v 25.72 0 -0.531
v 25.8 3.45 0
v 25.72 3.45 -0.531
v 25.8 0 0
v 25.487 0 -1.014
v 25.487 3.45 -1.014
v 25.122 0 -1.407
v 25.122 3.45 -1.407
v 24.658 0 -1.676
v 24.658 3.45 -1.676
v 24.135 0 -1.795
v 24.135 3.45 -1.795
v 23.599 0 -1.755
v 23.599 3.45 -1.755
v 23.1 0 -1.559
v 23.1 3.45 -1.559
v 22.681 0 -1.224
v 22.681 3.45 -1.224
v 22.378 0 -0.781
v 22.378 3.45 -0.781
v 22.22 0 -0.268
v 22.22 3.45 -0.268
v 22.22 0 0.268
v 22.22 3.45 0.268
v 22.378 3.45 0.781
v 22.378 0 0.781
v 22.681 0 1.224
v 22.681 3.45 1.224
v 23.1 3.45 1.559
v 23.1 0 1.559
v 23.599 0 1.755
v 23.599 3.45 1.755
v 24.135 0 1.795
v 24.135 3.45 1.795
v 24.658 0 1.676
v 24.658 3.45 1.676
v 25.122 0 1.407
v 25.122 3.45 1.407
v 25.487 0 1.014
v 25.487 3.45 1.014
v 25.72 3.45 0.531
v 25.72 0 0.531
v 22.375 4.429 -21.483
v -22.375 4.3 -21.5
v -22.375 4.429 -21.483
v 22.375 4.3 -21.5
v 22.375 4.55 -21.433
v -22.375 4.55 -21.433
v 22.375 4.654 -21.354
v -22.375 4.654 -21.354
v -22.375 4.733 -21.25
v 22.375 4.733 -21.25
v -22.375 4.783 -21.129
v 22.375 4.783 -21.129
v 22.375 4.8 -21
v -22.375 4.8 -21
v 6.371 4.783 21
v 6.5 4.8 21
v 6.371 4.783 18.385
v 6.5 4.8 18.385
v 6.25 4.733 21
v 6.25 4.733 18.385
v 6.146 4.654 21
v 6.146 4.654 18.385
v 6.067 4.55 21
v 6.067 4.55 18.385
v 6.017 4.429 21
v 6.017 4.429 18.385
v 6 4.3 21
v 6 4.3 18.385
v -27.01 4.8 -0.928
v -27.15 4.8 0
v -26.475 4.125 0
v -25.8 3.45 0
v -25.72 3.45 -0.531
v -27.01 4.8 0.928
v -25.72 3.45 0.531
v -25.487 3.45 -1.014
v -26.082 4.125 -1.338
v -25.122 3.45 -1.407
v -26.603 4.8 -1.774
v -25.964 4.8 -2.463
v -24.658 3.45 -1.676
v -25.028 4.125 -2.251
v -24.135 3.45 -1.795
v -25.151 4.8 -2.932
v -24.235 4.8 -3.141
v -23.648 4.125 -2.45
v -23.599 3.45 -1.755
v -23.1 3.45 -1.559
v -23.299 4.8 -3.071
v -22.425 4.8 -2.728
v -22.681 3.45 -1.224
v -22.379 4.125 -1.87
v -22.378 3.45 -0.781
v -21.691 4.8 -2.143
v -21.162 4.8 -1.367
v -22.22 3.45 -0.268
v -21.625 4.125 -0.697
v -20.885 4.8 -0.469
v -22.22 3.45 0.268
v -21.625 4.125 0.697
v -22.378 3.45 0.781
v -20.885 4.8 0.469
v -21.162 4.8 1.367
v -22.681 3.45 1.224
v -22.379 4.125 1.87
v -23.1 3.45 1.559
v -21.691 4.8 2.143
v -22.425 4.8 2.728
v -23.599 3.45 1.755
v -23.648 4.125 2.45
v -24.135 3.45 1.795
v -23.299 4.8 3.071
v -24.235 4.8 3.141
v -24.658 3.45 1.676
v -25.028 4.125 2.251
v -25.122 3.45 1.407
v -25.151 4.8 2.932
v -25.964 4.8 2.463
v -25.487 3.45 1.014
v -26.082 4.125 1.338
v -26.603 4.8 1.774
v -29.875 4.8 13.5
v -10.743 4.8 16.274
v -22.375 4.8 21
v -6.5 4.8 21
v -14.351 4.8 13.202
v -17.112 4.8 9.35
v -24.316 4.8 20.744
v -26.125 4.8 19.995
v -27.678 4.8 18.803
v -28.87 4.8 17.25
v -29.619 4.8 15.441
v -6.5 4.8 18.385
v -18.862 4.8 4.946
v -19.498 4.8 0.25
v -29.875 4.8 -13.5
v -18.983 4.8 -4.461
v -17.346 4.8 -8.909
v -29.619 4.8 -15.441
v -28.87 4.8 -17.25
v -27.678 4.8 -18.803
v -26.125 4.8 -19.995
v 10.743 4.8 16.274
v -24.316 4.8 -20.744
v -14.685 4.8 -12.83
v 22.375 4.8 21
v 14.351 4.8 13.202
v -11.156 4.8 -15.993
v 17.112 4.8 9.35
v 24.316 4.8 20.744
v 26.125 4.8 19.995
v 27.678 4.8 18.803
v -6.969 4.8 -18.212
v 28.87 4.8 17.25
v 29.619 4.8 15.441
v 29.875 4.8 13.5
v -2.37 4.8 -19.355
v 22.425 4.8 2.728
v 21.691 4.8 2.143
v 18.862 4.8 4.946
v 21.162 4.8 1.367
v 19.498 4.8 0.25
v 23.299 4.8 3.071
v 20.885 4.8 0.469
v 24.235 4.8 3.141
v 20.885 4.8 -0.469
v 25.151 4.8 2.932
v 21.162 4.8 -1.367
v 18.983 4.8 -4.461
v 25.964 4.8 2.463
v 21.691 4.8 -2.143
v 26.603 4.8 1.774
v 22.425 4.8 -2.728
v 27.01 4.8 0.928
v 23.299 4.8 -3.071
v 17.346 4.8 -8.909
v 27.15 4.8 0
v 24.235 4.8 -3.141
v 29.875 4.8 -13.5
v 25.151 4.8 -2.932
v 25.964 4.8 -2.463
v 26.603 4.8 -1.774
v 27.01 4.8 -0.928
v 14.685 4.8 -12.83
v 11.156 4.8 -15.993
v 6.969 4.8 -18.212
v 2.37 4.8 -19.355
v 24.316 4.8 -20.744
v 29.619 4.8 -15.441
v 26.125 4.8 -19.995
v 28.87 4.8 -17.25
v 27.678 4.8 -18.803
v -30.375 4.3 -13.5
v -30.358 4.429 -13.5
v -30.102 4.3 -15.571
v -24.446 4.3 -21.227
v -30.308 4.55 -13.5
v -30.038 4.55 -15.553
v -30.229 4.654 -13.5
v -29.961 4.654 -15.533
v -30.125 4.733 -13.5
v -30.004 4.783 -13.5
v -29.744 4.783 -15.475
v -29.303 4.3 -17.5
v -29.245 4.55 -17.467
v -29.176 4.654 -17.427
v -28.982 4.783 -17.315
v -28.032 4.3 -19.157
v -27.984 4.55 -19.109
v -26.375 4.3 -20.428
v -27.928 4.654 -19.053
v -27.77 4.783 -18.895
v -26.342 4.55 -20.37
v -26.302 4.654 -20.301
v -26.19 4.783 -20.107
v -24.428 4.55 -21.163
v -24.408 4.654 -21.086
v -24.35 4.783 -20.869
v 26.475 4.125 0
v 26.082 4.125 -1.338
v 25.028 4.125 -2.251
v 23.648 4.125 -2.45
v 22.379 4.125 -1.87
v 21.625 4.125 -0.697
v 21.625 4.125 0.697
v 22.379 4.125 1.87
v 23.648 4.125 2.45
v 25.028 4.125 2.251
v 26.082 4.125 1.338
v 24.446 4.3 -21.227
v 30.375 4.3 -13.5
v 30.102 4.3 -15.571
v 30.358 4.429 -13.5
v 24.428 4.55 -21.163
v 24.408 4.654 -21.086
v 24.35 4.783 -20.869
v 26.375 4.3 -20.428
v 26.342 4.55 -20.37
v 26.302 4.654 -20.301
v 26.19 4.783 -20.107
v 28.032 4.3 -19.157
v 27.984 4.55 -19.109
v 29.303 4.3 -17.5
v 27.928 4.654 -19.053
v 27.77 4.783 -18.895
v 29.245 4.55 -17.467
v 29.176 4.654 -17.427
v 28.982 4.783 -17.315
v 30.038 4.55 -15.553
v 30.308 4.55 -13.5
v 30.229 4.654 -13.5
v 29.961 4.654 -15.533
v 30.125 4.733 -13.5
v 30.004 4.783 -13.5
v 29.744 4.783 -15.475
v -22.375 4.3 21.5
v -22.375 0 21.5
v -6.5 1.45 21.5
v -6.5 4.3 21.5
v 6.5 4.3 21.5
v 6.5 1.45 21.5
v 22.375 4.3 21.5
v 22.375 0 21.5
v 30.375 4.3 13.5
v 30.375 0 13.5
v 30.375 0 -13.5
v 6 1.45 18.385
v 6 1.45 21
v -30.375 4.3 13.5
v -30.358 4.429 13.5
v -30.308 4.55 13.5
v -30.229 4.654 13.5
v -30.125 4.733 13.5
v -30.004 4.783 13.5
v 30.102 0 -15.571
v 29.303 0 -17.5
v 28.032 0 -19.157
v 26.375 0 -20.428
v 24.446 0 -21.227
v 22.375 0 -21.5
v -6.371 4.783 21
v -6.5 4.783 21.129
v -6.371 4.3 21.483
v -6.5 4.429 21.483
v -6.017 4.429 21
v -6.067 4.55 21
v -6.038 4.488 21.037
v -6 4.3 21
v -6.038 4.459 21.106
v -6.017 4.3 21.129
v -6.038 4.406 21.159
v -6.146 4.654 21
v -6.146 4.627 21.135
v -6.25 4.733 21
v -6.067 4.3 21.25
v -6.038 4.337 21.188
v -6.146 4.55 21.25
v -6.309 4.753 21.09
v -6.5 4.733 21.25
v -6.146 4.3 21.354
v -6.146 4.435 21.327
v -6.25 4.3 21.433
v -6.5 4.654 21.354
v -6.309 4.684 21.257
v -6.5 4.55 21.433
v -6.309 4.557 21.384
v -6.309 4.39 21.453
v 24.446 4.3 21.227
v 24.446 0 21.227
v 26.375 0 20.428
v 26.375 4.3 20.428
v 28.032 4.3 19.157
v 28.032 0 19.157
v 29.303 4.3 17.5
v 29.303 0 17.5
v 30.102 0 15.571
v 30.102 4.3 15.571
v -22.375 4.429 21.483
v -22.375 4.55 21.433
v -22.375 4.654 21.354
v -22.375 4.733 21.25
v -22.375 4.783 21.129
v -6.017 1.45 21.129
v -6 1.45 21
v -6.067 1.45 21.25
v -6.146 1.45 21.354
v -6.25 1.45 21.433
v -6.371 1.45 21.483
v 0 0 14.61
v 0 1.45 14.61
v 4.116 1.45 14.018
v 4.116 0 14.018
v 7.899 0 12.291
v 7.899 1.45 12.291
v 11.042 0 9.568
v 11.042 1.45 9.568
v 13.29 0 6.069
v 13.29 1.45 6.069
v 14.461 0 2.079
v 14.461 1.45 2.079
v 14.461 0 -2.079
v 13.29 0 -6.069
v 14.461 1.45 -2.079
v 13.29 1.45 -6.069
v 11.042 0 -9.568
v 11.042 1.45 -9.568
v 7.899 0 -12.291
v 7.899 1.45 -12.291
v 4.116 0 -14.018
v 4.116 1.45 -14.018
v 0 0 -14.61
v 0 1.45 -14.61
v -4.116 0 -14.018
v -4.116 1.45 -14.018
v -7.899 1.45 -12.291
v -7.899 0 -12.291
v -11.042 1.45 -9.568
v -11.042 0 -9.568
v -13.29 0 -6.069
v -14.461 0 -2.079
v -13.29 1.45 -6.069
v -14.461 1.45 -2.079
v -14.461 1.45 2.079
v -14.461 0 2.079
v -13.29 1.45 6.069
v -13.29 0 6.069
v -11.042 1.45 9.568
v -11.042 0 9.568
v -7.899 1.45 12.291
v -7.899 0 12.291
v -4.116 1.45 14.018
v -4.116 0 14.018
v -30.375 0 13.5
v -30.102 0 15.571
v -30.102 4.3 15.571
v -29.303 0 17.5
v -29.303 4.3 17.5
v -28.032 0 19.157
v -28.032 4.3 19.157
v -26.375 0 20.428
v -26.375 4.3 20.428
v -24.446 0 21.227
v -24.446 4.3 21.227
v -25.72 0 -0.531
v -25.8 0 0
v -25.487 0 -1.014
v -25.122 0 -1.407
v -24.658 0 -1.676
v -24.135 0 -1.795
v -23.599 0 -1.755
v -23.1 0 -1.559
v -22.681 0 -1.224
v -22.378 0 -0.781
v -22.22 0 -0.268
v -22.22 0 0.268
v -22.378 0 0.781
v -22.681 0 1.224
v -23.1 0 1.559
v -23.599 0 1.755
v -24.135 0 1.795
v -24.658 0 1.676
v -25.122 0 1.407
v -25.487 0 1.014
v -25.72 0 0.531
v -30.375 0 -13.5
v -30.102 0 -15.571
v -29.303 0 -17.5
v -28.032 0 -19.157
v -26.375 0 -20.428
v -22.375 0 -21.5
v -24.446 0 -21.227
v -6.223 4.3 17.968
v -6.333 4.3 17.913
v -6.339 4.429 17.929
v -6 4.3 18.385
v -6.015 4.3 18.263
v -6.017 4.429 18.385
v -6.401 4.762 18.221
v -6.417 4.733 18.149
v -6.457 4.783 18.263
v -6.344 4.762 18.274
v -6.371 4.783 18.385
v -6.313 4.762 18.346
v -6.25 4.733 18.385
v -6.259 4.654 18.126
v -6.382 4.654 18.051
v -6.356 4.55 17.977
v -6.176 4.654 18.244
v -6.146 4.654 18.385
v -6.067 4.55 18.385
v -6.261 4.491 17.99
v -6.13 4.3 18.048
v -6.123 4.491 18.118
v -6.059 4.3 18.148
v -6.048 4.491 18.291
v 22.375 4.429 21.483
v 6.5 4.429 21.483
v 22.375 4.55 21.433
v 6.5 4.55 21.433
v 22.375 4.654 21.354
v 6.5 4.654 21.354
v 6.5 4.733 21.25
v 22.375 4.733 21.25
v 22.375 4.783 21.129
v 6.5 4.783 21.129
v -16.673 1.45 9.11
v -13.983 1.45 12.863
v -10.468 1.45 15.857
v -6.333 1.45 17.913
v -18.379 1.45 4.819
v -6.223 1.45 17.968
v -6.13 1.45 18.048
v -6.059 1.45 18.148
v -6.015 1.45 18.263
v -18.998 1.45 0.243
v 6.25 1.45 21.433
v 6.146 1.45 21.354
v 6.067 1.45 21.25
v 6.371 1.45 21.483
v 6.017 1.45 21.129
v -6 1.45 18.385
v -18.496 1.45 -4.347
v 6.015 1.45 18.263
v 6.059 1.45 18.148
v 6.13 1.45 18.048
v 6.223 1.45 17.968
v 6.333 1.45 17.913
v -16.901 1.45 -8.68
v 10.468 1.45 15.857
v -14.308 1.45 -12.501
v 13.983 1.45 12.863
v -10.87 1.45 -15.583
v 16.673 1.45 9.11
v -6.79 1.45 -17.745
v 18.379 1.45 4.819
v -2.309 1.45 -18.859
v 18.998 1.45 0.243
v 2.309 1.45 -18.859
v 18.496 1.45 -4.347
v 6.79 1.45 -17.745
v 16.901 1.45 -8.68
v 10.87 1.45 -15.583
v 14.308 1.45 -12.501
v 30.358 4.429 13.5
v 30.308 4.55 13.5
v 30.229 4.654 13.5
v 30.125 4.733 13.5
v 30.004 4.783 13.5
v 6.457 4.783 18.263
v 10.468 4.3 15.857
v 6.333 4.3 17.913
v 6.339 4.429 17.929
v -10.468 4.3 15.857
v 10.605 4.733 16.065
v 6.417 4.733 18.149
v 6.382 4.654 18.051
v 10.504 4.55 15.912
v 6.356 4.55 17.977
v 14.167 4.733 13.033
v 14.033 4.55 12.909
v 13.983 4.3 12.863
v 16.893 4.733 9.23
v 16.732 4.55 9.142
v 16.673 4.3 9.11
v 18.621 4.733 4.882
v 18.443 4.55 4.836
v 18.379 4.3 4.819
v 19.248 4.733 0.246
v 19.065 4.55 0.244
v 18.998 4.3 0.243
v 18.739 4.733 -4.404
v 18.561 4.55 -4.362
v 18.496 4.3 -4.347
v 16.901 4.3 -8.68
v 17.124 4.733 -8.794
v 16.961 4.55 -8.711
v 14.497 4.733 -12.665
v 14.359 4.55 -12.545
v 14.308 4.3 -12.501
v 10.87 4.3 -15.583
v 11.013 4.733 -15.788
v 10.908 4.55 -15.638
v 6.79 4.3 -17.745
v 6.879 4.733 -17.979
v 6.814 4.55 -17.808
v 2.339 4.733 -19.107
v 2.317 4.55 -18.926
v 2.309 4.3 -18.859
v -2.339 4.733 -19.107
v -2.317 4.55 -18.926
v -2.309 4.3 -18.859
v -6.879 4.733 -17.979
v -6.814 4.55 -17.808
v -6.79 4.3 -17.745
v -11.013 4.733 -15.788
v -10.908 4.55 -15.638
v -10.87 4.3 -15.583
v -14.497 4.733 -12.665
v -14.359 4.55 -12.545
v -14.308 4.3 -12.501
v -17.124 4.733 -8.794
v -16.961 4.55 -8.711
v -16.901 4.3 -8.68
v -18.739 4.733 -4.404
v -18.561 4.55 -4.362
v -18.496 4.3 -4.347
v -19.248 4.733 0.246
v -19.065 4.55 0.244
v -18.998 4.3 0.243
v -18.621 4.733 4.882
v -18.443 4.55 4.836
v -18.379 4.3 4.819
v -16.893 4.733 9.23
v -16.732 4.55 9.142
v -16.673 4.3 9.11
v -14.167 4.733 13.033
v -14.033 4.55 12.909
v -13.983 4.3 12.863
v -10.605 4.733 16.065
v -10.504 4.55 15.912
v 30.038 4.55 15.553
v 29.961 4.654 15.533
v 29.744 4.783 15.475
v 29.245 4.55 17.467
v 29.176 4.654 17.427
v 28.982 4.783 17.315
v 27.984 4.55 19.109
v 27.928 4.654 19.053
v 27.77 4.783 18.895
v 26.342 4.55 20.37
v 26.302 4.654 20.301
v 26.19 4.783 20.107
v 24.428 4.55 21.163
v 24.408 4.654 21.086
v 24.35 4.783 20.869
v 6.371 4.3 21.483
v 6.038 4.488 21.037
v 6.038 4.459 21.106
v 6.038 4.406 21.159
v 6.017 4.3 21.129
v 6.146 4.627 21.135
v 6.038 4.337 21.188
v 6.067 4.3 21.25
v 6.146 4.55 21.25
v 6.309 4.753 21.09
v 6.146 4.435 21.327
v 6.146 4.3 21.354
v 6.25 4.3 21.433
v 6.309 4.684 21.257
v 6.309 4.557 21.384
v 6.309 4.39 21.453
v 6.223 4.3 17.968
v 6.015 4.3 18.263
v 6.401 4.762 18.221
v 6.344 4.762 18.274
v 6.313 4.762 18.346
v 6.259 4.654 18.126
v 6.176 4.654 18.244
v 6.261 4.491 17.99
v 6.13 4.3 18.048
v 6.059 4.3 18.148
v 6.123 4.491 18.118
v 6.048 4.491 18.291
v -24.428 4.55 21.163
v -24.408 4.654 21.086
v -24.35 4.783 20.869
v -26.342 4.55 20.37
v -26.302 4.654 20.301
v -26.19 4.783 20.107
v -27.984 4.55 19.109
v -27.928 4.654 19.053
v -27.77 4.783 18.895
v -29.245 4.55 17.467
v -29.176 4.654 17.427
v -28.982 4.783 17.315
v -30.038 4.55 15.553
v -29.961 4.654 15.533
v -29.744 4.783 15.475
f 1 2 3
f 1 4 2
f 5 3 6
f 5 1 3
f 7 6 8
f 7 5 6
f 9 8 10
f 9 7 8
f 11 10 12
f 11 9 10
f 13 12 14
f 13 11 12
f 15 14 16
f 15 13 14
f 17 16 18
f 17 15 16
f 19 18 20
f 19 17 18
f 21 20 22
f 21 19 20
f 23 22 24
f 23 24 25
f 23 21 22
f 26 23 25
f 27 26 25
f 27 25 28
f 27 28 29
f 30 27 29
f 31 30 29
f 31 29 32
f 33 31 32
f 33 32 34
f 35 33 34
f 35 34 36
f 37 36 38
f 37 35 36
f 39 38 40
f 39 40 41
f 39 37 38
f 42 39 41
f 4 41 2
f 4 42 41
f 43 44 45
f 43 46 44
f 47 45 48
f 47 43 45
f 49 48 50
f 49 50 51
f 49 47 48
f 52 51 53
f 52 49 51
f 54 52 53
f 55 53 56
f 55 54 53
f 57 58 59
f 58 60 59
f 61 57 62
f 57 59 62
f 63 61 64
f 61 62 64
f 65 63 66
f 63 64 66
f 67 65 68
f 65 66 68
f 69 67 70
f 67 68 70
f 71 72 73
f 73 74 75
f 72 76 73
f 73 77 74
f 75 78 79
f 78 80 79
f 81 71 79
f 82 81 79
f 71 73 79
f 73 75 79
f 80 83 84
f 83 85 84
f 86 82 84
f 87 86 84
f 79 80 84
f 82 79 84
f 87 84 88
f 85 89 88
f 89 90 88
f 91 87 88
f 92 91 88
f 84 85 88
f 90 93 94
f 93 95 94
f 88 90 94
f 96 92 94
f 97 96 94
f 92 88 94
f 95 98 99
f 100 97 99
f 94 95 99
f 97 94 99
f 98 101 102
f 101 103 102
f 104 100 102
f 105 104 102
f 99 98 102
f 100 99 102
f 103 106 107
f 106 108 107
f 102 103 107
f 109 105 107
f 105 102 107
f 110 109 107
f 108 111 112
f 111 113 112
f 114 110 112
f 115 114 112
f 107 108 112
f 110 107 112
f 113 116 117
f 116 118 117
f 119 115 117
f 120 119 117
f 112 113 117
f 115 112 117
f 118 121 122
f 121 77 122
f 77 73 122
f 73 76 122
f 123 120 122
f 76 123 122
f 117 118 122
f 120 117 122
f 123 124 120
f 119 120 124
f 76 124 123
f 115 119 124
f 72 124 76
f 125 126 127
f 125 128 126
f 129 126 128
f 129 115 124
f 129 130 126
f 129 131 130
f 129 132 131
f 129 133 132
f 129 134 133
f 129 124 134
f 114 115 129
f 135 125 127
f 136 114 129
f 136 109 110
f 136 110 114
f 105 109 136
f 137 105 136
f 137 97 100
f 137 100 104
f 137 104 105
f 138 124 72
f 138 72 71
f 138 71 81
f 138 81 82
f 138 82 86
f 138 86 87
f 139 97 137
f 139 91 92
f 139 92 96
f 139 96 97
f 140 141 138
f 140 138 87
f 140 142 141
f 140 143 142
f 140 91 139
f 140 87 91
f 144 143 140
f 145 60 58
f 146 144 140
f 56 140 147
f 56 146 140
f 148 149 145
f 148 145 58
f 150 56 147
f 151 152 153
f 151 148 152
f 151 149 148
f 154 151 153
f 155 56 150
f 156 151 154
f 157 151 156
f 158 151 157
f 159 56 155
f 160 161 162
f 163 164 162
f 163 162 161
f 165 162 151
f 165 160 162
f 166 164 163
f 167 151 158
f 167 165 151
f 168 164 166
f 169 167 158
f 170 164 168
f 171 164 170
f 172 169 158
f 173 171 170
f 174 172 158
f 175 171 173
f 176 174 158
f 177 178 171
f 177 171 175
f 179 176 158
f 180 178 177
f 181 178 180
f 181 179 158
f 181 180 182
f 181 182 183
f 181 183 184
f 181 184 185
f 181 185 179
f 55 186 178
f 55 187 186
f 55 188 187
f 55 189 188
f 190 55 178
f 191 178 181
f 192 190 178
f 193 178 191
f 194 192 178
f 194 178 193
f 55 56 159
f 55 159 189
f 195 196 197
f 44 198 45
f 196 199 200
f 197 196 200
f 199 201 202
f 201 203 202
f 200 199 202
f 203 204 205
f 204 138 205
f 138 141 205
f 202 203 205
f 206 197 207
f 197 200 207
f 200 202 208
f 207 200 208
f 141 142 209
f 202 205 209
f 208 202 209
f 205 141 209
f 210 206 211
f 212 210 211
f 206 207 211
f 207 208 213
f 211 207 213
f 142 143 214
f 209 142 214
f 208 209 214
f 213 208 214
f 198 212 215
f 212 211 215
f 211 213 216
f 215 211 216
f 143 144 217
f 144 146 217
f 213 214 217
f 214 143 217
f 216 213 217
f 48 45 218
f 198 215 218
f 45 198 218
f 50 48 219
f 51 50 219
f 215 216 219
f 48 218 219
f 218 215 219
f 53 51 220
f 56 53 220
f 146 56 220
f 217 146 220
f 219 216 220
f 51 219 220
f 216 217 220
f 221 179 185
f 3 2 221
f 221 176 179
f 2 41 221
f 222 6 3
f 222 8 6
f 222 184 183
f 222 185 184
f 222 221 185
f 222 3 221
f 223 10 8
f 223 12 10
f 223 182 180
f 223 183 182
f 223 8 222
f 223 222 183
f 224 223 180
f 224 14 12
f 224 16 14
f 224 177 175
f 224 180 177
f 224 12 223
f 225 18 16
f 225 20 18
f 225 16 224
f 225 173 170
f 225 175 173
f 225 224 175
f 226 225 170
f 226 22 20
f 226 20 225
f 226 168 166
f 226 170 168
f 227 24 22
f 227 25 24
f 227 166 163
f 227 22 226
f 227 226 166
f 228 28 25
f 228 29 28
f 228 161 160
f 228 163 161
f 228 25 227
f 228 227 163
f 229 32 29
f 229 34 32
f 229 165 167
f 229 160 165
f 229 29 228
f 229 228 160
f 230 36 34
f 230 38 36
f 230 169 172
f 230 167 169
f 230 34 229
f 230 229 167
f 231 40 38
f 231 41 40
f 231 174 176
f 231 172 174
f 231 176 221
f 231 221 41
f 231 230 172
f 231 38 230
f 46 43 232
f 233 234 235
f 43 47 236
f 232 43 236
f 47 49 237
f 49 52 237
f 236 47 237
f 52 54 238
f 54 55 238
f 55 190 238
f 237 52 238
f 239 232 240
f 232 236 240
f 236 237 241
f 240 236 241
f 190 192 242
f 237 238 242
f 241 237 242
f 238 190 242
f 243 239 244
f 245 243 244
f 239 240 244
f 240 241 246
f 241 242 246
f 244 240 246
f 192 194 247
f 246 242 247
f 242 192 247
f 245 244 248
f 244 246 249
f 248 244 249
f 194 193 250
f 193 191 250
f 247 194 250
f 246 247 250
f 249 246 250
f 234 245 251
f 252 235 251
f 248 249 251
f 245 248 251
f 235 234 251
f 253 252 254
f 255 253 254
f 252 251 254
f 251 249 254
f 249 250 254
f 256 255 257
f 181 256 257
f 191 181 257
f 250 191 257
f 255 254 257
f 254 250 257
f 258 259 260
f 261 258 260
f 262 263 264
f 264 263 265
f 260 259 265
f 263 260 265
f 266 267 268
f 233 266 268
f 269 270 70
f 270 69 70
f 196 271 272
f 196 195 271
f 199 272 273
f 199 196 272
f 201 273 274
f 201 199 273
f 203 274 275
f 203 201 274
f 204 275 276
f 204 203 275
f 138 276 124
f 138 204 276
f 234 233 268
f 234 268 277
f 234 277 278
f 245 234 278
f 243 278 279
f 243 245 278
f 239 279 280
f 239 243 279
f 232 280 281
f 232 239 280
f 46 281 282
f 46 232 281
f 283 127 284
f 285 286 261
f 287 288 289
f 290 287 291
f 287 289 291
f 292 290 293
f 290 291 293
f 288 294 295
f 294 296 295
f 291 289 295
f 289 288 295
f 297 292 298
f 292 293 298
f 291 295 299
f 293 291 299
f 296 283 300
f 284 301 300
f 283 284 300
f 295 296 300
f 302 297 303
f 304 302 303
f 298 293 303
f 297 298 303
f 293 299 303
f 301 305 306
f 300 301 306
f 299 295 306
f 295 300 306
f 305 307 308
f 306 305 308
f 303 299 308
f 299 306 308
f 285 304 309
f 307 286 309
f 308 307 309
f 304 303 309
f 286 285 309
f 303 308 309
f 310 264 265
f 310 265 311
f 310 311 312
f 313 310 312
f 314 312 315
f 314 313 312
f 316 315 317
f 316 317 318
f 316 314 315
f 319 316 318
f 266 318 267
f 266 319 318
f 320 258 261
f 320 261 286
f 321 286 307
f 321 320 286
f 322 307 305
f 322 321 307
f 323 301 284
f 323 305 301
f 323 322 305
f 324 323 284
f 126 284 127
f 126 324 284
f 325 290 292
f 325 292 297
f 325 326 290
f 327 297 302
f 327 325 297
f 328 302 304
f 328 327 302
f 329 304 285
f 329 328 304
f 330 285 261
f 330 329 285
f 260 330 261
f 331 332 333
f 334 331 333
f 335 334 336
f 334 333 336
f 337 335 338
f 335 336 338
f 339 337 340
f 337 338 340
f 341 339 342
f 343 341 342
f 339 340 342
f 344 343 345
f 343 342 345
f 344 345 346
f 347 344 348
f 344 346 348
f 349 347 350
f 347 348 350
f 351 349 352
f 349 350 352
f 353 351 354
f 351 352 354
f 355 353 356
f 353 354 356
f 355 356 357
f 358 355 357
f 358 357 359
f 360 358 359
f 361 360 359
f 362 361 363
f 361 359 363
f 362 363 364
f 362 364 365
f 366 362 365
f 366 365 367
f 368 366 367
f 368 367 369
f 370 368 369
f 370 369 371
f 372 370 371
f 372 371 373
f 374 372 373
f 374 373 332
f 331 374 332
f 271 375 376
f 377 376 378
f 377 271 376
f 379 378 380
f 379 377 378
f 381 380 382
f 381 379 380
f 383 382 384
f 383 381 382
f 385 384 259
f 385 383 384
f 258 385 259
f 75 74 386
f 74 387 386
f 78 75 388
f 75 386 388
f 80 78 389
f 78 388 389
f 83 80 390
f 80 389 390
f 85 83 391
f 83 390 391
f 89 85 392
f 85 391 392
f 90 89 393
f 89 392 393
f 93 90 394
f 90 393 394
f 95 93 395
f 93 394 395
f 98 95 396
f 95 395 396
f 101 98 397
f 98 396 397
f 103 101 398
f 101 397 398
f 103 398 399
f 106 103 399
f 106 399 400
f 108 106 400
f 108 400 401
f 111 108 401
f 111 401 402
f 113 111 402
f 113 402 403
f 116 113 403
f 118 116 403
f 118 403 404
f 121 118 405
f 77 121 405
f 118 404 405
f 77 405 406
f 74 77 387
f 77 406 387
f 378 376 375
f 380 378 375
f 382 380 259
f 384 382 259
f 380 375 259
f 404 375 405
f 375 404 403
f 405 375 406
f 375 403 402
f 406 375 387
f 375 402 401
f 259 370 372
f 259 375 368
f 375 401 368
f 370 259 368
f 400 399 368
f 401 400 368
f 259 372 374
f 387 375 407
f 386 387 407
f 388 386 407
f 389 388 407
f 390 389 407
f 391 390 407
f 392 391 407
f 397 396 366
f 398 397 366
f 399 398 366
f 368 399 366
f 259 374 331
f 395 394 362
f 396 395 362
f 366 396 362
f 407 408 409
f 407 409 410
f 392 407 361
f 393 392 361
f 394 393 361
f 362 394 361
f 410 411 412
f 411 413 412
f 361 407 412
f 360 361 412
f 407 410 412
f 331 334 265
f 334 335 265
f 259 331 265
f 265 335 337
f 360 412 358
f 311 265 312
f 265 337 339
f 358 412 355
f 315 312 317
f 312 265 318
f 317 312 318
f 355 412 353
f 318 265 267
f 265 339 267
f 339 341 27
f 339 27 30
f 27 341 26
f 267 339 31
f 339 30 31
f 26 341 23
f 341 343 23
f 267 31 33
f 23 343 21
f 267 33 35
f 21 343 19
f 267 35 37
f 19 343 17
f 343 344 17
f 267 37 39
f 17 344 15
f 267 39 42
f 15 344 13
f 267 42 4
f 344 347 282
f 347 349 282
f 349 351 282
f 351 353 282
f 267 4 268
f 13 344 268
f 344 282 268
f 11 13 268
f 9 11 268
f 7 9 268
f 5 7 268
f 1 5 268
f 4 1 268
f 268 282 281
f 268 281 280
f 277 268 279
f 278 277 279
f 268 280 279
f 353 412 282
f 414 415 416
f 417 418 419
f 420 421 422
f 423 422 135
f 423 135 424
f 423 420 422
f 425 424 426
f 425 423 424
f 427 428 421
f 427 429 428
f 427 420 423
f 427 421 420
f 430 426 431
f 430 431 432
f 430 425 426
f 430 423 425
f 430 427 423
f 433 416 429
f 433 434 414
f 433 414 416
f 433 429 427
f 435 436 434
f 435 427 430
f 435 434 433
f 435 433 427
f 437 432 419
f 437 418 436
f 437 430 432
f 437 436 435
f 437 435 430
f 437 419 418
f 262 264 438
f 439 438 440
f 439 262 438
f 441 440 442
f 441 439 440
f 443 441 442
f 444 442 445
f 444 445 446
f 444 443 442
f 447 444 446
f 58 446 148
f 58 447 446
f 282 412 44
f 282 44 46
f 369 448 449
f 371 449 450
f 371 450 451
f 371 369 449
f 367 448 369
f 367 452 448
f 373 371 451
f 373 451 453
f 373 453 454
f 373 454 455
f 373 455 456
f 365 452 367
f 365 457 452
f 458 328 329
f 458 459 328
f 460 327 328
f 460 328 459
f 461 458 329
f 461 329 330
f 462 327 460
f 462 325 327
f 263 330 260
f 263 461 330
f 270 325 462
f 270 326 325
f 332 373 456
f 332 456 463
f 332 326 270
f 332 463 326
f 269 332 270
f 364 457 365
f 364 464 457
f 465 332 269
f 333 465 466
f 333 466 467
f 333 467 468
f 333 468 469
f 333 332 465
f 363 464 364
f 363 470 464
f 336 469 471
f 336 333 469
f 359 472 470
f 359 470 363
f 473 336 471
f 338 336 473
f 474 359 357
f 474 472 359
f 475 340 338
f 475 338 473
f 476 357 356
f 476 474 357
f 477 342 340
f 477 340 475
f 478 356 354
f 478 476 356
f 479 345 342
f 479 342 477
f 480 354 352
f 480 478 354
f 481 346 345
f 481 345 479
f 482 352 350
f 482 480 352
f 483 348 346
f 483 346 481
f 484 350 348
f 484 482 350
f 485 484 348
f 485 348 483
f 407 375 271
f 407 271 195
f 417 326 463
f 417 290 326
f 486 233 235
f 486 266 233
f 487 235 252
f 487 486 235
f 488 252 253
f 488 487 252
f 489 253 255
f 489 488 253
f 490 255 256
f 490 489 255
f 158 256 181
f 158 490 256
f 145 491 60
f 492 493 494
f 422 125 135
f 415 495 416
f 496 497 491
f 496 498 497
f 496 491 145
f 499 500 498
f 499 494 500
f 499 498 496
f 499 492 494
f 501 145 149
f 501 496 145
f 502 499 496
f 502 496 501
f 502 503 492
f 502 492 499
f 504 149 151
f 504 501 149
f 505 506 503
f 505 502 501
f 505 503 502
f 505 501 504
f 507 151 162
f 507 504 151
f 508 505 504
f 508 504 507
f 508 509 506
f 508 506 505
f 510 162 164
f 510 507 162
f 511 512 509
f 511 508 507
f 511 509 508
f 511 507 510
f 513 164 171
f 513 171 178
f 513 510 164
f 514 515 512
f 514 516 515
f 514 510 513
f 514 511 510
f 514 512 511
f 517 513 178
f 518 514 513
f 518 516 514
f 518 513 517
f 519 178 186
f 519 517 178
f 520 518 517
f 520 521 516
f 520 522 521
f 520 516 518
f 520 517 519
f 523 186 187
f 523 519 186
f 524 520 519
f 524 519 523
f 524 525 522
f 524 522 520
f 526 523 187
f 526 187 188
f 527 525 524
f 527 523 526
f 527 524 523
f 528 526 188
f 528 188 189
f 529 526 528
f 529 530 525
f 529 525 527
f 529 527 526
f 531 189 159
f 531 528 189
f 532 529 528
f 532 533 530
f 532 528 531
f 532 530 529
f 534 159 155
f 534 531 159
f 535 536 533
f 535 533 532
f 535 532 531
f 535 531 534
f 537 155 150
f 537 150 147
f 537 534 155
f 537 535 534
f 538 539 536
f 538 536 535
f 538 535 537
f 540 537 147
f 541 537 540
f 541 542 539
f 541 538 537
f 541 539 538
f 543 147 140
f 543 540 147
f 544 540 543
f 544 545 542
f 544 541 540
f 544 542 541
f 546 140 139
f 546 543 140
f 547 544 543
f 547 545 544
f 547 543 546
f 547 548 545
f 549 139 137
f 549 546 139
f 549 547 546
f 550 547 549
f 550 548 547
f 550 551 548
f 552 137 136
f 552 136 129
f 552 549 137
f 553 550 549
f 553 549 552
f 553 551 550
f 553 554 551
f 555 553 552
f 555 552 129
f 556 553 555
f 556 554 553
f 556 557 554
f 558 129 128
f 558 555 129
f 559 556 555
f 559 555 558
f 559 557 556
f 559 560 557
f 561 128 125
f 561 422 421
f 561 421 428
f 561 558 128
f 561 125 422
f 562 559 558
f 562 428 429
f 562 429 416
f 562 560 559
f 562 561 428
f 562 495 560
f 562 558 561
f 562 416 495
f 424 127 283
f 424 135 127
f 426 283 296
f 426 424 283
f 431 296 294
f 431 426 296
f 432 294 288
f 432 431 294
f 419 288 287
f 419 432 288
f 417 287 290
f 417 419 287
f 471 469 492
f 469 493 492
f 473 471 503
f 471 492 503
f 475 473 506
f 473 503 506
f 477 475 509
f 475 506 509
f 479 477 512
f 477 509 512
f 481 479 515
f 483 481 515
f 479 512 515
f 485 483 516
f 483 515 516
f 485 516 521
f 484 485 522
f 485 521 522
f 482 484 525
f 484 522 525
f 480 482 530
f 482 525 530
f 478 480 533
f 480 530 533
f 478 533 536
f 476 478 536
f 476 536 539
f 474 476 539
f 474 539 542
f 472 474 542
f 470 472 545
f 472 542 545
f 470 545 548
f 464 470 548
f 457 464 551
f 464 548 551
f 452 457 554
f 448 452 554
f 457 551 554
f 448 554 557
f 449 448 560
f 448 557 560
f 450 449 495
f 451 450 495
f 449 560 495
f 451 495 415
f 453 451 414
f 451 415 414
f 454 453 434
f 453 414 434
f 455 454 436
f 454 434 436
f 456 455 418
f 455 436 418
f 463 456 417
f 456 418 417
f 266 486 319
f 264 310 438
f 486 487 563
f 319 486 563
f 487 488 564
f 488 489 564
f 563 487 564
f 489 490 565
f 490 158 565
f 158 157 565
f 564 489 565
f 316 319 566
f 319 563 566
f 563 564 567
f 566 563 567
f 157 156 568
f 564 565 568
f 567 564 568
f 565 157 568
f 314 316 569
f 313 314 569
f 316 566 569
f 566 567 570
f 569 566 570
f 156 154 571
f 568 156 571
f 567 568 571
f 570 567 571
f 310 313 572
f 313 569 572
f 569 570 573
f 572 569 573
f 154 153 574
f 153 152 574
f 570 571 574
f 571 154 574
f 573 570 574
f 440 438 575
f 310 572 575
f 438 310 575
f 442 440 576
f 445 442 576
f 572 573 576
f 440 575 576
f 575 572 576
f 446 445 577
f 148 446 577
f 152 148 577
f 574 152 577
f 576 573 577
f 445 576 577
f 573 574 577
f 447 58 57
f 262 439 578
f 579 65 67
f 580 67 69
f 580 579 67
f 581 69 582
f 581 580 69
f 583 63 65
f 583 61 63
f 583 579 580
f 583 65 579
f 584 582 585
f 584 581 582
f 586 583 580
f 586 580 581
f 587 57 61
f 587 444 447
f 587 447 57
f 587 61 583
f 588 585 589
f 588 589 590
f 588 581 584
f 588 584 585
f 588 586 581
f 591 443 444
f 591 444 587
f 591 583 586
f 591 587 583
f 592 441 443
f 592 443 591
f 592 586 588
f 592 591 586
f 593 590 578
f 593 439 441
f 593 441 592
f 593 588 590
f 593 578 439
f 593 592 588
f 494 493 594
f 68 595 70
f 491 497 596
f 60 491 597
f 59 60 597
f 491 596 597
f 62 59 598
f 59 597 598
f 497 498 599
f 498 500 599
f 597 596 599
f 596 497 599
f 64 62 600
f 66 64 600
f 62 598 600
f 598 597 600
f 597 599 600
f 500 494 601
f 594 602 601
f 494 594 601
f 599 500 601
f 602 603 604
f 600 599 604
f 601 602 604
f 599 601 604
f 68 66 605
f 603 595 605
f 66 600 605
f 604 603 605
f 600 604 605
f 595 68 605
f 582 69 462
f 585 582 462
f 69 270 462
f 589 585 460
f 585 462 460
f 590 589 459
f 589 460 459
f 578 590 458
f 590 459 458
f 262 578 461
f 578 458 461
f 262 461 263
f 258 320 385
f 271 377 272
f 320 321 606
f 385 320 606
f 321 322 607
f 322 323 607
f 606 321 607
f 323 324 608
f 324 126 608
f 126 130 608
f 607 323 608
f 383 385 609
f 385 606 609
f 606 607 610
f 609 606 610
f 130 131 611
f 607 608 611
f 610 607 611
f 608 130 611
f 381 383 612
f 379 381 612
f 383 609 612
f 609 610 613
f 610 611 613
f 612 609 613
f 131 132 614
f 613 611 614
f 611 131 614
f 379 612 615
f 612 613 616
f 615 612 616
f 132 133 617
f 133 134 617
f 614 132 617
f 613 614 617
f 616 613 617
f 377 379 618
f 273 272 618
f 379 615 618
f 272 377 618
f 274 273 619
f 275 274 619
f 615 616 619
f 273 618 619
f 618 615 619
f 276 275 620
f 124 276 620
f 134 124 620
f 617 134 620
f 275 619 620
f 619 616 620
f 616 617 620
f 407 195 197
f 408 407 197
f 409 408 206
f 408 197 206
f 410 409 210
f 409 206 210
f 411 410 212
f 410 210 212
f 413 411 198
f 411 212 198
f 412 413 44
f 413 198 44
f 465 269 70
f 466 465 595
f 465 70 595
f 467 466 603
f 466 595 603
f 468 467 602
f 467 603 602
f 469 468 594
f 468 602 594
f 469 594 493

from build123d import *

# Parameters (mm, degrees)
SKETCH1_W                                       = 60.75
SKETCH1_H                                       = 43
BOSS_EXTRUDE1_DEPTH                             = 4.8
FILLET1_R                                       = 8
SKETCH2_R                                       = 19
CUT_EXTRUDE1_DEPTH                              = 3.35
SKETCH3_R                                       = 14.61
CUT_EXTRUDE2_DEPTH                              = 38.364597214
SKETCH4_W                                       = 12
SKETCH4_H                                       = 11.029070592
CUT_EXTRUDE3_DEPTH                              = 3.35
CSK_FOR_M3_FLAT_HEAD_MACHINE_SCREW1_D           = 3.6
CSK_FOR_M3_FLAT_HEAD_MACHINE_SCREW1_CSINK_D     = 6.3
CSK_FOR_M3_FLAT_HEAD_MACHINE_SCREW1_CSINK_ANGLE = 90
FILLET2_R                                       = 0.5


with BuildPart() as part:
    # Sketch1 → Boss-Extrude1 (new body)
    with BuildSketch(Plane(origin=(0, 0, 0), x_dir=(1, 0, 0), z_dir=(0, 1, 0))):
        Rectangle(SKETCH1_W, SKETCH1_H)
    extrude(amount=BOSS_EXTRUDE1_DEPTH)

    # Fillet1
    fillet1_edges = [part.edges().sort_by_distance(p)[0] for p in [
        (30.375, 2.4, 21.5),
        (-30.375, 2.4, 21.5),
        (-30.375, 2.4, -21.5),
        (30.375, 2.4, -21.5),
    ]]
    fillet(fillet1_edges, radius=FILLET1_R)

    # Sketch2 → Cut-Extrude1 (cut)
    with BuildSketch(Plane(origin=(0, 4.8, 0), x_dir=(1, 0, 0), z_dir=(0, 1, 0))):
        with Locations(Location((0, 0, 0), (0, 0, 270))):
            Circle(SKETCH2_R)
    extrude(amount=-CUT_EXTRUDE1_DEPTH, mode=Mode.SUBTRACT)

    # Sketch3 → Cut-Extrude2 (cut, through all)
    with BuildSketch(Plane(origin=(0, 1.45, 0), x_dir=(1, 0, 0), z_dir=(0, 1, 0))):
        with Locations(Location((0, 0, 0), (0, 0, 270))):
            Circle(SKETCH3_R)
    extrude(amount=-CUT_EXTRUDE2_DEPTH, mode=Mode.SUBTRACT)

    # Sketch4 → Cut-Extrude3 (cut)
    with BuildSketch(Plane(origin=(0, 4.8, 0), x_dir=(1, 0, 0), z_dir=(0, 1, 0))):
        with Locations((0, -19)):
            Rectangle(SKETCH4_W, SKETCH4_H)
    extrude(amount=-CUT_EXTRUDE3_DEPTH, mode=Mode.SUBTRACT)

    # CSK for M3 Flat Head Machine Screw1 (through all)
    with Locations(Plane(origin=(0, 4.8, 0), x_dir=(1, 0, 0), z_dir=(0, 1, 0))):
        with Locations((-24, 0), (0, 0)):
            csk_for_m3_flat_head_machine_screw1 = CounterSinkHole(CSK_FOR_M3_FLAT_HEAD_MACHINE_SCREW1_D / 2, CSK_FOR_M3_FLAT_HEAD_MACHINE_SCREW1_CSINK_D / 2, counter_sink_angle=CSK_FOR_M3_FLAT_HEAD_MACHINE_SCREW1_CSINK_ANGLE)

    # Mirror1: CSK for M3 Flat Head Machine Screw1 across plane
    add(csk_for_m3_flat_head_machine_screw1.mirror(Plane(origin=(0, 0, 0), x_dir=(0, 0, 1), z_dir=(1, 0, 0))), mode=Mode.SUBTRACT)

    # Fillet2
    fillet2_edges = [part.edges().sort_by_distance(p)[0] for p in [
        (-30.375, 4.8, 0),
        (0, 4.8, -21.5),
        (30.375, 4.8, 0),
        (-14.1875, 4.8, 21.5),
        (-28.031854249, 4.8, 19.156854249),
        (28.031854249, 4.8, 19.156854249),
        (28.031854249, 4.8, -19.156854249),
        (-28.031854249, 4.8, -19.156854249),
        (0, 4.8, -19),
        (14.1875, 4.8, 21.5),
        (6, 4.8, 19.763878189),
        (-6, 4.8, 19.763878189),
        (6, 3.125, 21.5),
        (6, 3.125, 18.027756377),
        (-6, 3.125, 21.5),
        (-6, 3.125, 18.027756377),
    ]]
    fillet(fillet2_edges, radius=FILLET2_R)


solid = part.part
